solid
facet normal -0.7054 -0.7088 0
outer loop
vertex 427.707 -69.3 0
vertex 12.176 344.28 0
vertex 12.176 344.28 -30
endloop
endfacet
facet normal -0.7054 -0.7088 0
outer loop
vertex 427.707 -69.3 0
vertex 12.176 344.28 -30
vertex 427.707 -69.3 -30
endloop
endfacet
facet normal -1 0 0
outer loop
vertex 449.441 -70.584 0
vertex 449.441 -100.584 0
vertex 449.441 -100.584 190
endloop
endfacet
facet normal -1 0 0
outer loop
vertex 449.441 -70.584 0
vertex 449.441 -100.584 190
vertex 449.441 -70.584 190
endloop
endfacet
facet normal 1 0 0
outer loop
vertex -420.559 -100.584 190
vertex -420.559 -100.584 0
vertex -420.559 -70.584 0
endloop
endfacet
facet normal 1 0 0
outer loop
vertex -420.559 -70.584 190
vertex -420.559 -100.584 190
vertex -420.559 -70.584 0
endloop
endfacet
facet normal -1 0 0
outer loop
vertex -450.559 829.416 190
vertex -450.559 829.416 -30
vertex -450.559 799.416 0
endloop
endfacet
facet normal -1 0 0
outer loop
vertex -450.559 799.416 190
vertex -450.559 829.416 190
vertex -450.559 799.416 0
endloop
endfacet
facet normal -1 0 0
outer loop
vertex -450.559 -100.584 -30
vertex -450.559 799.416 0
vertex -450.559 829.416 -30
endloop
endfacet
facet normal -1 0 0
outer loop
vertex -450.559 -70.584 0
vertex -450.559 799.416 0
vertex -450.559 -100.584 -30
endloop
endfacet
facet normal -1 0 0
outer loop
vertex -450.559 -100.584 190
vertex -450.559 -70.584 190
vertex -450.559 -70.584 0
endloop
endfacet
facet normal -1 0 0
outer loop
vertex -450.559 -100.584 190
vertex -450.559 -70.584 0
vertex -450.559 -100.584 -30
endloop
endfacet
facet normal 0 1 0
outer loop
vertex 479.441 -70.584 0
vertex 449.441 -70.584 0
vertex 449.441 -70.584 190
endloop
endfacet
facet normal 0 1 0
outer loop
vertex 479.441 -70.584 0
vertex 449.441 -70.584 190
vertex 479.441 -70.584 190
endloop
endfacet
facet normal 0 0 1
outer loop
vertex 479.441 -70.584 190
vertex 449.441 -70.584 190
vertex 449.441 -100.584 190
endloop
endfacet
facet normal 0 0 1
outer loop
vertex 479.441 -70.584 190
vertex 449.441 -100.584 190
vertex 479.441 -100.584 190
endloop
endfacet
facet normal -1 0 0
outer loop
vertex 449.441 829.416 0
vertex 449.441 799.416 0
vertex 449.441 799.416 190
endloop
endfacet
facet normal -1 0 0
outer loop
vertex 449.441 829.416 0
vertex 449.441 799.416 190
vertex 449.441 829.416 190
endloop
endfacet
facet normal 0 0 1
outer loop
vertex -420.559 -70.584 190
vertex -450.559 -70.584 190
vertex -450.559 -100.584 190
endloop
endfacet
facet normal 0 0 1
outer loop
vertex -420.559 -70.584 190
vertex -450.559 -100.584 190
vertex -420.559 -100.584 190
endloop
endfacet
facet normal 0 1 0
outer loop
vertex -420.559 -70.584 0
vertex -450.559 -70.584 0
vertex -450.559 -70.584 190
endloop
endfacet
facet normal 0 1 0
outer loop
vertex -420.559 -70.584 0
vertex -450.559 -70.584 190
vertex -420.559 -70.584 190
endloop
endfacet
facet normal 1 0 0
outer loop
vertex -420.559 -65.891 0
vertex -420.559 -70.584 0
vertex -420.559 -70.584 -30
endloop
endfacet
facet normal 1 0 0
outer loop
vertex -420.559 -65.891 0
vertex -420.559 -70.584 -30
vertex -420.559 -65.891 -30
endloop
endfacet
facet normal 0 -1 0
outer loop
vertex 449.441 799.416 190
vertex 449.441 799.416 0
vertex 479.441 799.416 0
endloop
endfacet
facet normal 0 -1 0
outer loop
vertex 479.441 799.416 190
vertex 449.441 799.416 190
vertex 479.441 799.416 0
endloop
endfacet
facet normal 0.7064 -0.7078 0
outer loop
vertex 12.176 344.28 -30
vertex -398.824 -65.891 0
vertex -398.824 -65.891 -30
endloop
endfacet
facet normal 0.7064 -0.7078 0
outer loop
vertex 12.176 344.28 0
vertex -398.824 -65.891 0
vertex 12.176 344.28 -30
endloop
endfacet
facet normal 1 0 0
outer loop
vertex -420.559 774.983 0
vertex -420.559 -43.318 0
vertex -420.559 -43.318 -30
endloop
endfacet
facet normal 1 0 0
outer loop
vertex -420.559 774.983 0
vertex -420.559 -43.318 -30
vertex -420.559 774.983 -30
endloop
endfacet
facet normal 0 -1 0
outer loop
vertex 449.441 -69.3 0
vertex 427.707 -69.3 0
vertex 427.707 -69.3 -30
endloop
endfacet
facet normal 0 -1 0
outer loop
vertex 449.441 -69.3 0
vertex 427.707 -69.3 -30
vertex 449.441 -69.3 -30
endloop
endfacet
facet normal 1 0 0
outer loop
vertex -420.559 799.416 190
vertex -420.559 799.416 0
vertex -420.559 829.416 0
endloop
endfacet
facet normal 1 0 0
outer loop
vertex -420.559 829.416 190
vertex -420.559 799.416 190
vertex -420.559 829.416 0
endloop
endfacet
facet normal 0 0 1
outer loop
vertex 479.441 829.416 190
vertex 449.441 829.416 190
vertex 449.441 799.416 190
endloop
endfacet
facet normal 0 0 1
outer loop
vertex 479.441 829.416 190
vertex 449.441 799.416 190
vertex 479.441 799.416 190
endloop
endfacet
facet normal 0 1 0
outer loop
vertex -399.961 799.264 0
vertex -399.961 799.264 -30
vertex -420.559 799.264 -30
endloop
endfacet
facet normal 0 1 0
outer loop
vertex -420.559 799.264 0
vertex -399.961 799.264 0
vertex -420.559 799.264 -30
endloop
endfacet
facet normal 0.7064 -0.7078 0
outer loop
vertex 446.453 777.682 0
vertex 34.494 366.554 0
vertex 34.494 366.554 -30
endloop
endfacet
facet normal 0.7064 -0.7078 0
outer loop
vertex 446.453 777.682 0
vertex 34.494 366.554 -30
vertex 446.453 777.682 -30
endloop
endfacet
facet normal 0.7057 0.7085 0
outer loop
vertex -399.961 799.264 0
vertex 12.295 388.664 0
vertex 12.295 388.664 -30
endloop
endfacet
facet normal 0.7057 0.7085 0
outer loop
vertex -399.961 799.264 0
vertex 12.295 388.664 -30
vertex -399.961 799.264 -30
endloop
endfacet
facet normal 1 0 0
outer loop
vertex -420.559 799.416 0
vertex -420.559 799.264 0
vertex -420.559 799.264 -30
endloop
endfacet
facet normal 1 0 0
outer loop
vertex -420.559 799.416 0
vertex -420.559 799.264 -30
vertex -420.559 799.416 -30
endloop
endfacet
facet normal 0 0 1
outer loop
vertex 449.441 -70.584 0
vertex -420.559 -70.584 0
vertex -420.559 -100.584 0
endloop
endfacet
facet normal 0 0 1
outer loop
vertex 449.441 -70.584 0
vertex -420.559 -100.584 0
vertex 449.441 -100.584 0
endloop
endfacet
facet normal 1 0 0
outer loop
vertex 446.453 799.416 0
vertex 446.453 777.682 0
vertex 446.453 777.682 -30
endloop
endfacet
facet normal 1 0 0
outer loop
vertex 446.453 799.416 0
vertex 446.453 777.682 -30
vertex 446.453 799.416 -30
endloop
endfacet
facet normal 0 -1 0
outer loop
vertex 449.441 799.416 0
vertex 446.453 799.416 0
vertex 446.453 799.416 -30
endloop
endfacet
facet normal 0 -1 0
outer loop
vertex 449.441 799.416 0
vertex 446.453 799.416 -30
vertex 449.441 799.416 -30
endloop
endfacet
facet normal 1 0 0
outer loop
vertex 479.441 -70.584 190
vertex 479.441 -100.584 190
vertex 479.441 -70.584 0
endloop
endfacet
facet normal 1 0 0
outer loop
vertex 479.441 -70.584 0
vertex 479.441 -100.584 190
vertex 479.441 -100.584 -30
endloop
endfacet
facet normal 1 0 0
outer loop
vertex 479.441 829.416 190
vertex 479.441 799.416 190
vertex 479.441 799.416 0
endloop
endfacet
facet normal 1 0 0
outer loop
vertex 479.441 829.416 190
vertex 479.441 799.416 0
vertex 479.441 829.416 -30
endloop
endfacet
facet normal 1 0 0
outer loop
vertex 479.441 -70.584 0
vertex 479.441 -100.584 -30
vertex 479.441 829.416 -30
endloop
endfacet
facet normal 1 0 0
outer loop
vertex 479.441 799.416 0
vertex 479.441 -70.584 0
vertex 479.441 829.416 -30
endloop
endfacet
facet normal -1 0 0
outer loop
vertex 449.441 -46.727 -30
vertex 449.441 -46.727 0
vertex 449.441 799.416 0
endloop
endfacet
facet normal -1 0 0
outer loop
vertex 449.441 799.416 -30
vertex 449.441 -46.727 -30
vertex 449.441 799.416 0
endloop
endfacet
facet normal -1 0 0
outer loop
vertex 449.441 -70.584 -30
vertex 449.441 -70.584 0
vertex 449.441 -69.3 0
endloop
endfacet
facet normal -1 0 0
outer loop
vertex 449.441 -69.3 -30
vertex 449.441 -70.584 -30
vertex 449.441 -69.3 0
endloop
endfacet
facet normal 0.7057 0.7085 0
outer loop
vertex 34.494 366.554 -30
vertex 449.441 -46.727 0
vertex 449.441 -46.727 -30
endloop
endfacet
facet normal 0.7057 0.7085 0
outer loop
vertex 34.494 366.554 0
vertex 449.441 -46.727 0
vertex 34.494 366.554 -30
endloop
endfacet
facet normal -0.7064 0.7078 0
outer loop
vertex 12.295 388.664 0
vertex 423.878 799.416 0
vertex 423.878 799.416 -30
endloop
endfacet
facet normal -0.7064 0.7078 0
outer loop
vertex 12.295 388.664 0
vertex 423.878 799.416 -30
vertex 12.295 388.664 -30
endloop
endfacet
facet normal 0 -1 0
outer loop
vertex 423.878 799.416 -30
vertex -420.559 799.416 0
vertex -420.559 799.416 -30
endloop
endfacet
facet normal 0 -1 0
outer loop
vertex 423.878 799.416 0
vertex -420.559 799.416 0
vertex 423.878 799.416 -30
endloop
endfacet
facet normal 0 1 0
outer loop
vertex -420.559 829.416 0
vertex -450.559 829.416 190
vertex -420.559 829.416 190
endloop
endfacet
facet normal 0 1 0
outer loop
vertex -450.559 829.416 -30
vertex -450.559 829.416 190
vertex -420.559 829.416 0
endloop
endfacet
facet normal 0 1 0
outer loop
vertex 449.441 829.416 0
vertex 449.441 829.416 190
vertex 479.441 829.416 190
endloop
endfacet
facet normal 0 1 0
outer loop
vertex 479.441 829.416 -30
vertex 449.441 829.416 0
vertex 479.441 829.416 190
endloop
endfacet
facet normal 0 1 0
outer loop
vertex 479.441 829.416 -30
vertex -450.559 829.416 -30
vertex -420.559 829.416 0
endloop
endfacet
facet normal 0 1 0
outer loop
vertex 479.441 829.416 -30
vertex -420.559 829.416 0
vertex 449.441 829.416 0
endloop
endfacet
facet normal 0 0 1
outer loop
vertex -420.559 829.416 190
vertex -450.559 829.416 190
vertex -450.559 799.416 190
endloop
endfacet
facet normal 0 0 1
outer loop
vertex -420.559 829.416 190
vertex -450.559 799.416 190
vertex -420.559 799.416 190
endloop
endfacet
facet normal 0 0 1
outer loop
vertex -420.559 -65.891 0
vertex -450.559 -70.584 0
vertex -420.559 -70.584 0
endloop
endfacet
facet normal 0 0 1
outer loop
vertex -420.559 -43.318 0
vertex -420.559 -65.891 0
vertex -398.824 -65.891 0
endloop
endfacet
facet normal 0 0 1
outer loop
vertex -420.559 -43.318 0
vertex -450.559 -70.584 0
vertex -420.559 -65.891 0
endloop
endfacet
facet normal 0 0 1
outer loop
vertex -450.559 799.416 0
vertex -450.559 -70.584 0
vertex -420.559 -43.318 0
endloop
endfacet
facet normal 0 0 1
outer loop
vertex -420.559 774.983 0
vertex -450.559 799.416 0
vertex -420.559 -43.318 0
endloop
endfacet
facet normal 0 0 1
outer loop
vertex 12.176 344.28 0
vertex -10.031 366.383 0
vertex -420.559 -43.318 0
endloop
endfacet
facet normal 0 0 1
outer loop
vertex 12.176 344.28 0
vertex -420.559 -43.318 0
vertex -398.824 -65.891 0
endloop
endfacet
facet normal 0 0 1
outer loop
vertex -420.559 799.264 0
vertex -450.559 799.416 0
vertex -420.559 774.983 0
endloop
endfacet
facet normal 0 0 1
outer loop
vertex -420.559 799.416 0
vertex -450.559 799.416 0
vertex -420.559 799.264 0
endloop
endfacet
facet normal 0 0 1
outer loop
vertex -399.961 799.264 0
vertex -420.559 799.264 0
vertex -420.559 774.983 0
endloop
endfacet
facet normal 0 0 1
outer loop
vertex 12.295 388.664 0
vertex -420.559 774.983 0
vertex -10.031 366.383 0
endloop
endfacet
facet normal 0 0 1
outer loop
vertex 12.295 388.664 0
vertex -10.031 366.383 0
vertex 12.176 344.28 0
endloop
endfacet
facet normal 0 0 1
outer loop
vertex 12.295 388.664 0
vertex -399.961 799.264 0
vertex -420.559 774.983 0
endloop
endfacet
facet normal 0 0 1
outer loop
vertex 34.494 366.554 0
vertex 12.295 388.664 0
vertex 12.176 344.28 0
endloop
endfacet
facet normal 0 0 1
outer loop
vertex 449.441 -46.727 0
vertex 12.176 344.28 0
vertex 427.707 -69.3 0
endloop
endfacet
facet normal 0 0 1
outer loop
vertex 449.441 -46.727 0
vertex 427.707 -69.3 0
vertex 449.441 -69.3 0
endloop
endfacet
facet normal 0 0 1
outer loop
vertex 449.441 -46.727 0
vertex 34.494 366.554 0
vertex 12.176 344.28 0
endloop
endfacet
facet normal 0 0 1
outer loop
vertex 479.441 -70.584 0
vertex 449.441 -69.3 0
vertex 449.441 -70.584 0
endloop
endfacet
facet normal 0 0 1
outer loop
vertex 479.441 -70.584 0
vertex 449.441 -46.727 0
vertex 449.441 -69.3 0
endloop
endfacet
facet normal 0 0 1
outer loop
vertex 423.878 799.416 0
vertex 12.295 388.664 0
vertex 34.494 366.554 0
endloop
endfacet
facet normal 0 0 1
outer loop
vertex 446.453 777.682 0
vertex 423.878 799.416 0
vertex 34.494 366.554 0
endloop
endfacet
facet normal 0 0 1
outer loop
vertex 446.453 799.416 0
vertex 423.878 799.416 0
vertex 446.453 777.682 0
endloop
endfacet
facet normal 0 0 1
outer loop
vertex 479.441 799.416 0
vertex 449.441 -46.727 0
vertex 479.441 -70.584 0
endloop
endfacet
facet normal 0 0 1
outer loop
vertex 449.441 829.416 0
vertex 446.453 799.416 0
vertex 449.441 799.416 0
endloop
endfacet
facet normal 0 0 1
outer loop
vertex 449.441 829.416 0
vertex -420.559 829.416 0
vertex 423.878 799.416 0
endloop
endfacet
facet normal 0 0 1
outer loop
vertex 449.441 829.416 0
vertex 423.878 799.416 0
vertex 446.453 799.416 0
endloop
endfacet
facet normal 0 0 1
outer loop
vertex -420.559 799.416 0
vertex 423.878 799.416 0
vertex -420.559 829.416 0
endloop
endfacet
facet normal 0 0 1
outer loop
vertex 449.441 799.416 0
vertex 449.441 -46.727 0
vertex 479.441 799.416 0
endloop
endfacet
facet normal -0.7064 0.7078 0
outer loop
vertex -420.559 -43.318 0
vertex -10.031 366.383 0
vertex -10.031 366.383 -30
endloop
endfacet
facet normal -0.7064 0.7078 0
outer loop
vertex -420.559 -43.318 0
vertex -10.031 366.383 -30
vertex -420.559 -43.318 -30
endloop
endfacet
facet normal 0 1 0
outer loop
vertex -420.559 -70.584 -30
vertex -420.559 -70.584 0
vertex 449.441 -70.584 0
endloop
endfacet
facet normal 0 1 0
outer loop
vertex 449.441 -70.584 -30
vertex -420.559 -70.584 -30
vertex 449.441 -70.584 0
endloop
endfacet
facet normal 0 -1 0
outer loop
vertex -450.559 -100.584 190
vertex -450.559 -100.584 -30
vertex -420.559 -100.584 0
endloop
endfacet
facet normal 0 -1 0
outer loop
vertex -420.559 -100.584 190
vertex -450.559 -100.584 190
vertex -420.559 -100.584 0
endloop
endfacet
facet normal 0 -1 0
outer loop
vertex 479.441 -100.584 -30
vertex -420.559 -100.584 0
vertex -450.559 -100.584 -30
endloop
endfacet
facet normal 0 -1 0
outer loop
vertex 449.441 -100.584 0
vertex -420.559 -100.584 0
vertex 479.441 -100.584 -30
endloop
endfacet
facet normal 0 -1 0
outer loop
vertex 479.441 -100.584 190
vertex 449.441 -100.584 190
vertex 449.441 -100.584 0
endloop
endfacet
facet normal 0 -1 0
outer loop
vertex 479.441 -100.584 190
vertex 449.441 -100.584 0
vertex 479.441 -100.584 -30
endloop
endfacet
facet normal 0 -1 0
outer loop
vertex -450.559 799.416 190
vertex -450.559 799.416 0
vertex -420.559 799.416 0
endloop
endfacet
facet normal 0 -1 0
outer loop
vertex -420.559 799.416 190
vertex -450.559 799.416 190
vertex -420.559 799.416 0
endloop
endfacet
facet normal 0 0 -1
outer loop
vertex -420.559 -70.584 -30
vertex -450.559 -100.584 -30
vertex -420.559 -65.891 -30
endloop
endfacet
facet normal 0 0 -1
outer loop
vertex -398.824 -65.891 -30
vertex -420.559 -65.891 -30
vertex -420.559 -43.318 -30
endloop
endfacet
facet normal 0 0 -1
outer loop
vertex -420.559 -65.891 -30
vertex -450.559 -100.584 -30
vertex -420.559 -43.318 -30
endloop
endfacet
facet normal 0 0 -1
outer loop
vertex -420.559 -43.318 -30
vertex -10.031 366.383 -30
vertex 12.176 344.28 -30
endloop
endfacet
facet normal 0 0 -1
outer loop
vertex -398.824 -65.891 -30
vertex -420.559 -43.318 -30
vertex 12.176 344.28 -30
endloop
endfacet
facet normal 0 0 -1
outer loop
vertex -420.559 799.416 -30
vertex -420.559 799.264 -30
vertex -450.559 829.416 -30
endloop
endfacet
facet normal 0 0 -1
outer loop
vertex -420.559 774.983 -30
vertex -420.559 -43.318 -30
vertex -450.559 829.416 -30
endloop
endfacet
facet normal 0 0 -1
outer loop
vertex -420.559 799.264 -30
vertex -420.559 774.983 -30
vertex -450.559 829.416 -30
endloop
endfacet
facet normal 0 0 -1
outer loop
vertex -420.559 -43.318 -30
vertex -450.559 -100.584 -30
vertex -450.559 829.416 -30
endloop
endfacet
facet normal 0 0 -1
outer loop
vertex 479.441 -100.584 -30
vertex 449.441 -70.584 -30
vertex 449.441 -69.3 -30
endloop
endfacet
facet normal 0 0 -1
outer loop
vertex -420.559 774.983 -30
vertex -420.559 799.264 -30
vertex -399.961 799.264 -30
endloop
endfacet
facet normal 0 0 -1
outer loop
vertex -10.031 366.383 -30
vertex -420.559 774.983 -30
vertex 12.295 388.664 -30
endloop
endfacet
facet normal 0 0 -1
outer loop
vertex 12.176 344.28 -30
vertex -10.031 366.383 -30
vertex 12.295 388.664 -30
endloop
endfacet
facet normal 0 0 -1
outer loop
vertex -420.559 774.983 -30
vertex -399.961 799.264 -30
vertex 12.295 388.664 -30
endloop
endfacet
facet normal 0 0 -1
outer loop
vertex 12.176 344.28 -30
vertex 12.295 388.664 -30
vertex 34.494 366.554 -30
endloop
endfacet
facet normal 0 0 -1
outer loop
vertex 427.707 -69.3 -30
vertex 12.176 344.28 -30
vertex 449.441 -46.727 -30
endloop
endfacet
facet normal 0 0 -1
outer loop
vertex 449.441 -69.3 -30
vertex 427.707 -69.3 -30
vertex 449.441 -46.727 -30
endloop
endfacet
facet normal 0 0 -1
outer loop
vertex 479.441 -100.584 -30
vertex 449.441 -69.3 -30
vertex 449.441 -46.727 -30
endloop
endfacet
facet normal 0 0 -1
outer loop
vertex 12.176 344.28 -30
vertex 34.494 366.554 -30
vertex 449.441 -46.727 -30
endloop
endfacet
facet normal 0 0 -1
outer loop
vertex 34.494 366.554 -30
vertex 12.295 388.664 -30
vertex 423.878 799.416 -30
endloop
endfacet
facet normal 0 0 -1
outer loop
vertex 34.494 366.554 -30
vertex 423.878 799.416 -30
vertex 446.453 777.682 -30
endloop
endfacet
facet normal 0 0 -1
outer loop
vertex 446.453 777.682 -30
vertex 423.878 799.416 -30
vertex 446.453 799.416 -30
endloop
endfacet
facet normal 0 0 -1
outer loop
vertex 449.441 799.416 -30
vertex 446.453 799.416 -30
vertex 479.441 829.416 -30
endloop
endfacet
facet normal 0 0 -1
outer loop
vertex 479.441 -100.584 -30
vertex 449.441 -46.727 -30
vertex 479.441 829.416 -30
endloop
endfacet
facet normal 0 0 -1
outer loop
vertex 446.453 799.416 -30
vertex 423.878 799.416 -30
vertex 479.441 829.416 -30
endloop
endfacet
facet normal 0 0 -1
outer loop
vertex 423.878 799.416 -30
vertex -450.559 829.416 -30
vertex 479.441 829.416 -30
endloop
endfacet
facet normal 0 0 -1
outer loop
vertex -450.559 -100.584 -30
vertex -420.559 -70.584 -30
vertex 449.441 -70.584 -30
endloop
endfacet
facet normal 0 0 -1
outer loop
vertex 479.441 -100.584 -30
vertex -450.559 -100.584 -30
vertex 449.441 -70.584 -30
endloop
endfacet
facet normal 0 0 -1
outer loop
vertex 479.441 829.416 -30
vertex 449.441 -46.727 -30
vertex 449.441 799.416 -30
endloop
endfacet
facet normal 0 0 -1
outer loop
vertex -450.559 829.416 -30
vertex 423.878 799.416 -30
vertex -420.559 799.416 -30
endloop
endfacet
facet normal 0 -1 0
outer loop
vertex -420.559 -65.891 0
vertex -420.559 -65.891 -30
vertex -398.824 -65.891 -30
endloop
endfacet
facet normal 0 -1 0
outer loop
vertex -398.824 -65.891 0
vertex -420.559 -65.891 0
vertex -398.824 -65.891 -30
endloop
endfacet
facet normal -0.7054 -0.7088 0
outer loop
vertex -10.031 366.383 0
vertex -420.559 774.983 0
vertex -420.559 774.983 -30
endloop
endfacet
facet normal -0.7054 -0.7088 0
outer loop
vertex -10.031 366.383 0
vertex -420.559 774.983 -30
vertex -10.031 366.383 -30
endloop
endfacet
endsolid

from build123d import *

# Parameters (mm, degrees)
F0_W     = 30
F0_H     = 30
F0_W_2   = 870
F0_H_2   = 870
F2_DEPTH = 30
F3_DEPTH = 30
F4_W     = 30
F4_H     = 30
F5_DEPTH = 190
F6_DEPTH = 15


with BuildPart() as f2:
    # F0 (on Top) → F2 (new body)
    with BuildSketch(Plane.XY):
        with Locations((-435.5585327744, 814.4162455201)):
            Rectangle(F0_W, F0_H)
        with Locations((14.4414672256, 814.4162455201)):
            Rectangle(F0_W_2, F0_H)
        with Locations((-435.5585327744, 364.4162455201)):
            Rectangle(F0_W, F0_H_2)
        with Locations((464.4414672256, 814.4162455201)):
            Rectangle(F0_W, F0_H)
        with Locations((-435.5585327744, -85.5837544799)):
            Rectangle(F0_W, F0_H)
        with Locations((464.4414672256, 364.4162455201)):
            Rectangle(F0_W, F0_H_2)
        with Locations((14.4414672256, -85.5837544799)):
            Rectangle(F0_W_2, F0_H)
        with Locations((464.4414672256, -85.5837544799)):
            Rectangle(F0_W, F0_H)
    extrude(amount=-F2_DEPTH)

    # F1 (on face) → F3 (join)
    with BuildSketch(Plane.XY):
        Polygon((-420.9787249565, -43.7369011343), (-420.9787249565, -65.8913552761), (-398.8242447376, -65.8913552761), (12.1761524069, 344.280398684), (-10.0305031789, 366.3827953016), align=None)
        Polygon((12.2952993787, 388.6635861224), (-10.0305031789, 366.3827953016), (12.1761524069, 344.280398684), (34.4943990212, 366.5536481084), align=None)
        Polygon((-422.4041998386, 776.8204212189), (-10.0305031789, 366.3827953016), (12.2952993787, 388.6635861224), (-399.9607563019, 799.2638349533), align=None)
        Polygon((34.4943990212, 366.5536481084), (12.1761524069, 344.280398684), (427.7071654797, -69.2997202277), (449.8616158962, -47.1452660859), align=None)
        Polygon((-422.4041998386, 799.2638349533), (-422.4041998386, 776.8204212189), (-399.9607563019, 799.2638349533), align=None)
        Polygon((424.2987632751, 799.836397171), (12.2952993787, 388.6635861224), (34.4943990212, 366.5536481084), (446.4532732964, 777.6819467545), align=None)
        Polygon((449.8616158962, -47.1452660859), (427.7071654797, -69.2997202277), (449.8616158962, -69.2997202277), align=None)
        Polygon((446.4532732964, 799.836397171), (424.2987632751, 799.836397171), (446.4532732964, 777.6819467545), align=None)
    extrude(amount=-F3_DEPTH)

    # F4 (on face) → F5 (join)
    with BuildSketch(Plane.XY):
        with Locations((464.4414672256, 814.4162455201)):
            Rectangle(F4_W, F4_H)
        with Locations((-435.5585327744, -85.5837544799)):
            Rectangle(F4_W, F4_H)
        with Locations((464.4414672256, -85.5837544799)):
            Rectangle(F4_W, F4_H)
        with Locations((-435.5585327744, 814.4162455201)):
            Rectangle(F4_W, F4_H)
    extrude(amount=F5_DEPTH)

    # F1 (on face) → F6 (join)
    with BuildSketch(Plane.XY):
        Polygon((-420.9787249565, -43.7369011343), (-420.9787249565, -65.8913552761), (-398.8242447376, -65.8913552761), (12.1761524069, 344.280398684), (-10.0305031789, 366.3827953016), align=None)
        Polygon((12.2952993787, 388.6635861224), (-10.0305031789, 366.3827953016), (12.1761524069, 344.280398684), (34.4943990212, 366.5536481084), align=None)
        Polygon((-422.4041998386, 776.8204212189), (-10.0305031789, 366.3827953016), (12.2952993787, 388.6635861224), (-399.9607563019, 799.2638349533), align=None)
        Polygon((34.4943990212, 366.5536481084), (12.1761524069, 344.280398684), (427.7071654797, -69.2997202277), (449.8616158962, -47.1452660859), align=None)
        Polygon((-422.4041998386, 799.2638349533), (-422.4041998386, 776.8204212189), (-399.9607563019, 799.2638349533), align=None)
        Polygon((424.2987632751, 799.836397171), (12.2952993787, 388.6635861224), (34.4943990212, 366.5536481084), (446.4532732964, 777.6819467545), align=None)
        Polygon((449.8616158962, -47.1452660859), (427.7071654797, -69.2997202277), (449.8616158962, -69.2997202277), align=None)
        Polygon((446.4532732964, 799.836397171), (424.2987632751, 799.836397171), (446.4532732964, 777.6819467545), align=None)
    extrude(amount=-F6_DEPTH)


solid = f2.part
